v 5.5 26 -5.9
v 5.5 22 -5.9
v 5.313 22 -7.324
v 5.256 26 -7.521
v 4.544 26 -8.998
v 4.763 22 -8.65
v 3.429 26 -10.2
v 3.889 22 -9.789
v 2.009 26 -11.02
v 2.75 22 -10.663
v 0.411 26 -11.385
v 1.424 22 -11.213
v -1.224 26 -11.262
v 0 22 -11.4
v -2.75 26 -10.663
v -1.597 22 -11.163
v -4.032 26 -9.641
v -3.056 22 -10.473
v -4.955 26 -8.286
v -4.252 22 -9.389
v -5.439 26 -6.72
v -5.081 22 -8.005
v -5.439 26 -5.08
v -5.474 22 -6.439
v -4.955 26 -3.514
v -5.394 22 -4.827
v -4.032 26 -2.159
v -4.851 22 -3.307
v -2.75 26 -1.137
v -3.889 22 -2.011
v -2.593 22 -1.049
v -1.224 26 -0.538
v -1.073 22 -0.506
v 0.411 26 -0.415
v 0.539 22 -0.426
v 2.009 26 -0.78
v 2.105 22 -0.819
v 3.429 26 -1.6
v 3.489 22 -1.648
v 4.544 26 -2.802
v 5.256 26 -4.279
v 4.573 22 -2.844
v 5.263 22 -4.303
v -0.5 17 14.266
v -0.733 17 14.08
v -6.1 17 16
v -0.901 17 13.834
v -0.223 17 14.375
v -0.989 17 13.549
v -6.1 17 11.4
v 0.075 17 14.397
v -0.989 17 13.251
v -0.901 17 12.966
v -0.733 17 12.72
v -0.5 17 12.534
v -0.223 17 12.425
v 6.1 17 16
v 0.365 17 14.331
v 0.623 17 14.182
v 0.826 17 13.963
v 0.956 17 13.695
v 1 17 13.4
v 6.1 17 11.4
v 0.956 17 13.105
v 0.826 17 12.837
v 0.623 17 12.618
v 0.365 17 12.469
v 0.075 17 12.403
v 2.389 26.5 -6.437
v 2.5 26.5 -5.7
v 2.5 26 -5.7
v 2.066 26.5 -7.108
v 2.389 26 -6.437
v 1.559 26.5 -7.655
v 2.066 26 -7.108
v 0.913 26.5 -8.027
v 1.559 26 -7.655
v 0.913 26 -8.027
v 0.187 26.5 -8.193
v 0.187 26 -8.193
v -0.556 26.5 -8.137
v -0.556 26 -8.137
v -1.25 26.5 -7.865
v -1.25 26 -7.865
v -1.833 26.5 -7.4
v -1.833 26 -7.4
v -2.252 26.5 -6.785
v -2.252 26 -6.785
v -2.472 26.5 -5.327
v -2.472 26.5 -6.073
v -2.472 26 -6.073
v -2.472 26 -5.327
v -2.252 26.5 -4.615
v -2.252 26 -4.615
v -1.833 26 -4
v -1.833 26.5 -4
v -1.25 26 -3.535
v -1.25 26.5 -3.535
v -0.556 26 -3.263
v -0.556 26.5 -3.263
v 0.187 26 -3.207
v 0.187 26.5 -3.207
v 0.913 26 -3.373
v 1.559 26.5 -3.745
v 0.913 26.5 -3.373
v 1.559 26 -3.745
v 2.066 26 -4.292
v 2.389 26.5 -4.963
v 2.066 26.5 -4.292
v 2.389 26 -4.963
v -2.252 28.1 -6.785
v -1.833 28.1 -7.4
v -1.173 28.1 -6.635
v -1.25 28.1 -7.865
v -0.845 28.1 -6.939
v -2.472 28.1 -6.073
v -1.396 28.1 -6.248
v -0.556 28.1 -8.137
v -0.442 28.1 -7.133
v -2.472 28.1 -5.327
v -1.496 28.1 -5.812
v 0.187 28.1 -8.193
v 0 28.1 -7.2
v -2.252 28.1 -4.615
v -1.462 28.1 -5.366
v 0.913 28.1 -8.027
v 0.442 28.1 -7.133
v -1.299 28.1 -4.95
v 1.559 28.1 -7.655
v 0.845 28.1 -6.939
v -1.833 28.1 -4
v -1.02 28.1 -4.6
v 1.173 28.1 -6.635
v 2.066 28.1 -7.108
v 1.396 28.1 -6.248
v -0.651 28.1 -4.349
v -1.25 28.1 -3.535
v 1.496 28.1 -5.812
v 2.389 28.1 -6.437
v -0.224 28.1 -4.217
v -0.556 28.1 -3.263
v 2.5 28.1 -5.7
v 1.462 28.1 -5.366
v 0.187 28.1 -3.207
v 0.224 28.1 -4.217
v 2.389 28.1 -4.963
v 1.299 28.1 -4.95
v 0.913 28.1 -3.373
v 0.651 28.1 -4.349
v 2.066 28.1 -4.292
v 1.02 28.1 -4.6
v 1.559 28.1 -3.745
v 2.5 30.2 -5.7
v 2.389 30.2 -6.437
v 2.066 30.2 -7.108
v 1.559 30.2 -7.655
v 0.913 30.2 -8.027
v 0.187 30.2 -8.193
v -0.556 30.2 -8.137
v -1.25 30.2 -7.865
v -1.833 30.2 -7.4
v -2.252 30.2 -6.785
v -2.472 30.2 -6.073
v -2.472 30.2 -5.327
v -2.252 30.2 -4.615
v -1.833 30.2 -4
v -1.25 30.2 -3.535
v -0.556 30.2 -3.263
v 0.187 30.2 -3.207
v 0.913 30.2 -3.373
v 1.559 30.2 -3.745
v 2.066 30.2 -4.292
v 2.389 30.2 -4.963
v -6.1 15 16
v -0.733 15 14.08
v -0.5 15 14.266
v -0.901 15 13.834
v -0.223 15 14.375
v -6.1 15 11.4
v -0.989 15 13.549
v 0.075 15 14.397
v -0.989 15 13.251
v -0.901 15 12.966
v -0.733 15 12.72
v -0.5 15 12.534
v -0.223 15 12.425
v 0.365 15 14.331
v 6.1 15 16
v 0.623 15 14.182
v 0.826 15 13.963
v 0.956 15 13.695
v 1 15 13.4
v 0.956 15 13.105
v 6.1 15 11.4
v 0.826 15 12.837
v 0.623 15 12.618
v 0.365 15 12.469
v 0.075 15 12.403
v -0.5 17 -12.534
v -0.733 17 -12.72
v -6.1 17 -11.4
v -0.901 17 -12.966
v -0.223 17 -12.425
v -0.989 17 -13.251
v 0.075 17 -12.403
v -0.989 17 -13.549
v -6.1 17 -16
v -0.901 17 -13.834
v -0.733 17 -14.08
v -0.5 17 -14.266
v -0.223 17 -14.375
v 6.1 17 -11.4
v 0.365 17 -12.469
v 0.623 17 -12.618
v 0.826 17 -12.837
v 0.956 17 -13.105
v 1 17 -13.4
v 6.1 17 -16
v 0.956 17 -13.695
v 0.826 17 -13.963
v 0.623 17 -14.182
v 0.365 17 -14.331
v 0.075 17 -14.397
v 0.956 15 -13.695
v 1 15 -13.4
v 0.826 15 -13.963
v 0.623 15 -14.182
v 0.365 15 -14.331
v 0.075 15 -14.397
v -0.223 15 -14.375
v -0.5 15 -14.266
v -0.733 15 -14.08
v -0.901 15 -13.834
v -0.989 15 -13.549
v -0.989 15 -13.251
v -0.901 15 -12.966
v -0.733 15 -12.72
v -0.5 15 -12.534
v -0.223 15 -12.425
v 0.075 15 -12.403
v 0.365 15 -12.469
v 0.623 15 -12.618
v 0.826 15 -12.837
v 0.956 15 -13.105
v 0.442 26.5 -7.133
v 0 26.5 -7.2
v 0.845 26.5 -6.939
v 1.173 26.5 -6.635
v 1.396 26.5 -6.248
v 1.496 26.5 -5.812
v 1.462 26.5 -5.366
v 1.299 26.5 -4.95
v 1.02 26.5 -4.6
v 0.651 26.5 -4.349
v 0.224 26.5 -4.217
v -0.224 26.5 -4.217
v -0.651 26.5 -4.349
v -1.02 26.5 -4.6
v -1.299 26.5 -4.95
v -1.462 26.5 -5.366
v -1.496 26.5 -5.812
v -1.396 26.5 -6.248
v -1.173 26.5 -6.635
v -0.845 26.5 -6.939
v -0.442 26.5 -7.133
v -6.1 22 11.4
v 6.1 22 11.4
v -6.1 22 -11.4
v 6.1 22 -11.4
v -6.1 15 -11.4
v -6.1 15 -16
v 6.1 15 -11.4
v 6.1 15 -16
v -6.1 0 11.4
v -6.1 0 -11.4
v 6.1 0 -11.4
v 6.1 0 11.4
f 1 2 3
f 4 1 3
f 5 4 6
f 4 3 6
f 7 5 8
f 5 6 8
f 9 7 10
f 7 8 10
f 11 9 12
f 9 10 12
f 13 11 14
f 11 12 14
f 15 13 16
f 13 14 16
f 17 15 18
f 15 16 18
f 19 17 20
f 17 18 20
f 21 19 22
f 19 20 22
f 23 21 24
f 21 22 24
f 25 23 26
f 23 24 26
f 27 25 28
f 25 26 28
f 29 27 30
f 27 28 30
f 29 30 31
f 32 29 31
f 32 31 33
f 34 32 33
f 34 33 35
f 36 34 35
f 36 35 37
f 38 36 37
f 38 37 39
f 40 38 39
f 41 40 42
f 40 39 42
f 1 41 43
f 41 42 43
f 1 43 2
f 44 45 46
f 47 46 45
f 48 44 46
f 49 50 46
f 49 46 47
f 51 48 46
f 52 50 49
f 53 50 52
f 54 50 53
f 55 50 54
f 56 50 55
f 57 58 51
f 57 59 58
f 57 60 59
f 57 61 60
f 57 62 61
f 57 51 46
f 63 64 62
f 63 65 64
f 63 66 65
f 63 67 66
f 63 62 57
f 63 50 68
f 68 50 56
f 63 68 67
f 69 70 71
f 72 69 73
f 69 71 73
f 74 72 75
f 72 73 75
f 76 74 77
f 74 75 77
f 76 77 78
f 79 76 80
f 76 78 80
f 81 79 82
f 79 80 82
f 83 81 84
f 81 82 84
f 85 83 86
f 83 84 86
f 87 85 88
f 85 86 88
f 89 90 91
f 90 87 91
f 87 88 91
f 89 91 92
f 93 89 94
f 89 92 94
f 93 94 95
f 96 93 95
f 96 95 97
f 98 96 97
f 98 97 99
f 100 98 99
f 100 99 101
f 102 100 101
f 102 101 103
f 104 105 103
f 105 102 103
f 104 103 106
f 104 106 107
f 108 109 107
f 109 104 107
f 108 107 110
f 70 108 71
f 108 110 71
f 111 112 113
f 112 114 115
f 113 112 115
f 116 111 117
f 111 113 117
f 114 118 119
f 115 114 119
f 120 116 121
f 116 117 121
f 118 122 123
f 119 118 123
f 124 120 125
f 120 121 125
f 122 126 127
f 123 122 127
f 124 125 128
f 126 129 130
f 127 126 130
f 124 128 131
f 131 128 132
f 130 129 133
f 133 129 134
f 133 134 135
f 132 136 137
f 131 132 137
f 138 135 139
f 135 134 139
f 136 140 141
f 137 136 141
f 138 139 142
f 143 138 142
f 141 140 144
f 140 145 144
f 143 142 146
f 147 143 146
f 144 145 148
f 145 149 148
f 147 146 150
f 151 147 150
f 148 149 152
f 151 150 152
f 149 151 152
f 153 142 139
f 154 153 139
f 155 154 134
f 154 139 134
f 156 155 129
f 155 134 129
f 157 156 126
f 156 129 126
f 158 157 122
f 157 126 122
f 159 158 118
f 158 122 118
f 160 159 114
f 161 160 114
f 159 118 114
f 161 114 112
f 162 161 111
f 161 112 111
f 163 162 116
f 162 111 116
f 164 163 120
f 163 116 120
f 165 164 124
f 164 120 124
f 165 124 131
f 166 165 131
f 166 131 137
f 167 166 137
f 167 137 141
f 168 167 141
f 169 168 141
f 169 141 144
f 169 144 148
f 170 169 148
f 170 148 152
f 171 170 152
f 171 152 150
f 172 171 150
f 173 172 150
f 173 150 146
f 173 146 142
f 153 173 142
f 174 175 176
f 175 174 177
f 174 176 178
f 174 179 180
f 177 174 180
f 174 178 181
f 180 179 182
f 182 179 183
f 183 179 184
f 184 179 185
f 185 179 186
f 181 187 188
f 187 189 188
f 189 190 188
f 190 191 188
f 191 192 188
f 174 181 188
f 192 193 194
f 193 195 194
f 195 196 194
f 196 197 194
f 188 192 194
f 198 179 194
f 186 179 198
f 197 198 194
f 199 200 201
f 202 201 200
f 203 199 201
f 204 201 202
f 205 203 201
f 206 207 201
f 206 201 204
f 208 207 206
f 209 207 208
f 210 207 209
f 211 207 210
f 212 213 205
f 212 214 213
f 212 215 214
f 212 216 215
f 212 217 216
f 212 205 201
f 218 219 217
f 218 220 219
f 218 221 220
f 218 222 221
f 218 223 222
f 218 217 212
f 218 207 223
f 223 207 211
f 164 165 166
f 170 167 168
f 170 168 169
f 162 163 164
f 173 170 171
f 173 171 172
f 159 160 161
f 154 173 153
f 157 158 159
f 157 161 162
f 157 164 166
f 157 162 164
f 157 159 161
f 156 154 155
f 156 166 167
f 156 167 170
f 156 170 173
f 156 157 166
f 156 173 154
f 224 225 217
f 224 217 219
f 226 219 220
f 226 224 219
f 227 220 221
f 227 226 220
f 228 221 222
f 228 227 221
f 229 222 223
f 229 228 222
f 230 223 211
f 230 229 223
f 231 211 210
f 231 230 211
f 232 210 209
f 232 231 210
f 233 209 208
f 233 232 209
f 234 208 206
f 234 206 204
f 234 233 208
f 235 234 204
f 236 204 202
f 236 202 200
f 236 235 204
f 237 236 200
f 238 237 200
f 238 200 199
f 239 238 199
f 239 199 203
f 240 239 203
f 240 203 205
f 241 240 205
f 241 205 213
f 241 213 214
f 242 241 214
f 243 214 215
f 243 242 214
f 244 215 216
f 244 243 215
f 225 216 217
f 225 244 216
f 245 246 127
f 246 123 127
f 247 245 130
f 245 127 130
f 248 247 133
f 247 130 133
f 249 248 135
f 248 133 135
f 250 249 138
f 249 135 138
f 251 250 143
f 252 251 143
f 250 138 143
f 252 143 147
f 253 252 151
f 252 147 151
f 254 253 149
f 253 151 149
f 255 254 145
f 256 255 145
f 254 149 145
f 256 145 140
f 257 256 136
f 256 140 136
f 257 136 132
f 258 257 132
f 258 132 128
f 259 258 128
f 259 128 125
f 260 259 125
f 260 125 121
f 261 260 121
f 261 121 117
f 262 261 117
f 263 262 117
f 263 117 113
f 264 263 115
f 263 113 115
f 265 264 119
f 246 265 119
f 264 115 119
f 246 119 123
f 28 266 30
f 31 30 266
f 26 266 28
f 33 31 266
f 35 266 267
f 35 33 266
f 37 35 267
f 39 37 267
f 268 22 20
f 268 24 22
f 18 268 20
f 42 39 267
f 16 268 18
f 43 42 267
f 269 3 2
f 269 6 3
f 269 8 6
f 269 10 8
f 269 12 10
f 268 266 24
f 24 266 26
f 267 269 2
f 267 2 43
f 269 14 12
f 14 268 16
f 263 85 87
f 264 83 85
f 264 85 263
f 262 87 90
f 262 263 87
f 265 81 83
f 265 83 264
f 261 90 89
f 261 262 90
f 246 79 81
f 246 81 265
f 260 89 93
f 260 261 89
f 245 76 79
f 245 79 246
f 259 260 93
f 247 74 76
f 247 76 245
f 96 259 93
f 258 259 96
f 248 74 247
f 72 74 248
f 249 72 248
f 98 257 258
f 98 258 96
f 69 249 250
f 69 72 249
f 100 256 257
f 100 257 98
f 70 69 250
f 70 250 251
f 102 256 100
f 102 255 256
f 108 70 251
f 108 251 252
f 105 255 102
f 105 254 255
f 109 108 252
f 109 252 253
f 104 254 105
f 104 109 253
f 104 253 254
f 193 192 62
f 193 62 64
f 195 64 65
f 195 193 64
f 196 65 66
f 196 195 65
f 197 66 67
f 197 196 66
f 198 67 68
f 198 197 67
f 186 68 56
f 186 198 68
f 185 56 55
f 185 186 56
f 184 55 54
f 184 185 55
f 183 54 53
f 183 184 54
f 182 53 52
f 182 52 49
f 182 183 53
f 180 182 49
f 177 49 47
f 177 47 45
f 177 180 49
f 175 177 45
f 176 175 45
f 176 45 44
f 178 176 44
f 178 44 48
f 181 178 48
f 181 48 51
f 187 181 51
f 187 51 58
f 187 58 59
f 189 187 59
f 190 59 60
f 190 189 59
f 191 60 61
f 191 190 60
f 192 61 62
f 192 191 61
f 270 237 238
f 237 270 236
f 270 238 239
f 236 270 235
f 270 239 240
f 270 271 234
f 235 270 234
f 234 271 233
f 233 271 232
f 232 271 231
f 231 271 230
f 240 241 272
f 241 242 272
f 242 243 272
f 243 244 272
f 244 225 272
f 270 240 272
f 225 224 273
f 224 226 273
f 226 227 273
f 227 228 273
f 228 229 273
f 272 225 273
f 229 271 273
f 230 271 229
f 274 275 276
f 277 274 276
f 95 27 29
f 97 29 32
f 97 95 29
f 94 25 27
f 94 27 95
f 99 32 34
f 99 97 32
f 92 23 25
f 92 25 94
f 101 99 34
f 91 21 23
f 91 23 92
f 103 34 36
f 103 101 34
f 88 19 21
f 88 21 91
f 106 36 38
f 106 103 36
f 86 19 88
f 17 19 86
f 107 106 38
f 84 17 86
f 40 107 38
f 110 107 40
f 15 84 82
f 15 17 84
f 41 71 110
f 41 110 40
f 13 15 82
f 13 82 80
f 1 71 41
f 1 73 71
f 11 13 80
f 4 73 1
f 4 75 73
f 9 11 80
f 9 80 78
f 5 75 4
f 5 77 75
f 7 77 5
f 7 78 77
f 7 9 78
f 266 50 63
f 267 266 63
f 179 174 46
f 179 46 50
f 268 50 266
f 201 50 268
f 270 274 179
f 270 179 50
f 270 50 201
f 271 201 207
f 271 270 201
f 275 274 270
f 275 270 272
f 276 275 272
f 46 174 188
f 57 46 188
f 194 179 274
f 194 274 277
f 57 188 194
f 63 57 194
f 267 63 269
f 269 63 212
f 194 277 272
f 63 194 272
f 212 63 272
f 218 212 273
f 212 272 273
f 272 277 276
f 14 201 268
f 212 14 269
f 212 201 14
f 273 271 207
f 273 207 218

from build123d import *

# Parameters (mm, degrees)
SKETCH2_W           = 12.2
SKETCH2_H           = 22.8
BOSS_EXTRUDE1_DEPTH = 22
SKETCH3_W           = 12.2
SKETCH3_H           = 4.6
SKETCH3_R           = 1
BOSS_EXTRUDE2_DEPTH = 2
SKETCH4_R           = 5.5
BOSS_EXTRUDE3_DEPTH = 4
SKETCH5_R           = 2.5
BOSS_EXTRUDE4_DEPTH = 4.2
SKETCH6_W           = 1
SKETCH6_H           = 1.6


with BuildPart() as part:
    # Sketch2 → Boss-Extrude1 (new body)
    with BuildSketch(Plane(origin=(0, 0, 0), x_dir=(1, 0, 0), z_dir=(0, 1, 0))):
        Rectangle(SKETCH2_W, SKETCH2_H)
    extrude(amount=BOSS_EXTRUDE1_DEPTH)

    # Sketch3 → Boss-Extrude2 (add)
    with BuildSketch(Plane(origin=(0, 15, 0), x_dir=(1, 0, 0), z_dir=(0, 1, 0))):
        with Locations((0, 13.7)):
            Rectangle(SKETCH3_W, SKETCH3_H)
        with Locations((0, 13.4)):
            Circle(SKETCH3_R, mode=Mode.SUBTRACT)
        with Locations((0, -13.7)):
            Rectangle(SKETCH3_W, SKETCH3_H)
        with Locations((0, -13.4)):
            Circle(SKETCH3_R, mode=Mode.SUBTRACT)
    extrude(amount=BOSS_EXTRUDE2_DEPTH)

    # Sketch4 → Boss-Extrude3 (add)
    with BuildSketch(Plane(origin=(0, 22, 0), x_dir=(1, 0, 0), z_dir=(0, 1, 0))):
        with Locations((0, 5.9)):
            Circle(SKETCH4_R)
    extrude(amount=BOSS_EXTRUDE3_DEPTH)

    # Sketch5 → Boss-Extrude4 (add)
    with BuildSketch(Plane(origin=(0, 26, 0), x_dir=(1, 0, 0), z_dir=(0, 1, 0))):
        with Locations((0, 5.7)):
            Circle(SKETCH5_R)
    extrude(amount=BOSS_EXTRUDE4_DEPTH)

    # Sketch6 → Cut-Revolve1 (revolve, cut)
    with BuildSketch(Plane(origin=(0, 0, 0), x_dir=(0, 0, -1), z_dir=(1, 0, 0))):
        with Locations((7.7, 27.3)):
            Rectangle(SKETCH6_W, SKETCH6_H)
    revolve(axis=Axis((0, 30.2, -5.7), (0, -1, 0)), mode=Mode.SUBTRACT)


solid = part.part
